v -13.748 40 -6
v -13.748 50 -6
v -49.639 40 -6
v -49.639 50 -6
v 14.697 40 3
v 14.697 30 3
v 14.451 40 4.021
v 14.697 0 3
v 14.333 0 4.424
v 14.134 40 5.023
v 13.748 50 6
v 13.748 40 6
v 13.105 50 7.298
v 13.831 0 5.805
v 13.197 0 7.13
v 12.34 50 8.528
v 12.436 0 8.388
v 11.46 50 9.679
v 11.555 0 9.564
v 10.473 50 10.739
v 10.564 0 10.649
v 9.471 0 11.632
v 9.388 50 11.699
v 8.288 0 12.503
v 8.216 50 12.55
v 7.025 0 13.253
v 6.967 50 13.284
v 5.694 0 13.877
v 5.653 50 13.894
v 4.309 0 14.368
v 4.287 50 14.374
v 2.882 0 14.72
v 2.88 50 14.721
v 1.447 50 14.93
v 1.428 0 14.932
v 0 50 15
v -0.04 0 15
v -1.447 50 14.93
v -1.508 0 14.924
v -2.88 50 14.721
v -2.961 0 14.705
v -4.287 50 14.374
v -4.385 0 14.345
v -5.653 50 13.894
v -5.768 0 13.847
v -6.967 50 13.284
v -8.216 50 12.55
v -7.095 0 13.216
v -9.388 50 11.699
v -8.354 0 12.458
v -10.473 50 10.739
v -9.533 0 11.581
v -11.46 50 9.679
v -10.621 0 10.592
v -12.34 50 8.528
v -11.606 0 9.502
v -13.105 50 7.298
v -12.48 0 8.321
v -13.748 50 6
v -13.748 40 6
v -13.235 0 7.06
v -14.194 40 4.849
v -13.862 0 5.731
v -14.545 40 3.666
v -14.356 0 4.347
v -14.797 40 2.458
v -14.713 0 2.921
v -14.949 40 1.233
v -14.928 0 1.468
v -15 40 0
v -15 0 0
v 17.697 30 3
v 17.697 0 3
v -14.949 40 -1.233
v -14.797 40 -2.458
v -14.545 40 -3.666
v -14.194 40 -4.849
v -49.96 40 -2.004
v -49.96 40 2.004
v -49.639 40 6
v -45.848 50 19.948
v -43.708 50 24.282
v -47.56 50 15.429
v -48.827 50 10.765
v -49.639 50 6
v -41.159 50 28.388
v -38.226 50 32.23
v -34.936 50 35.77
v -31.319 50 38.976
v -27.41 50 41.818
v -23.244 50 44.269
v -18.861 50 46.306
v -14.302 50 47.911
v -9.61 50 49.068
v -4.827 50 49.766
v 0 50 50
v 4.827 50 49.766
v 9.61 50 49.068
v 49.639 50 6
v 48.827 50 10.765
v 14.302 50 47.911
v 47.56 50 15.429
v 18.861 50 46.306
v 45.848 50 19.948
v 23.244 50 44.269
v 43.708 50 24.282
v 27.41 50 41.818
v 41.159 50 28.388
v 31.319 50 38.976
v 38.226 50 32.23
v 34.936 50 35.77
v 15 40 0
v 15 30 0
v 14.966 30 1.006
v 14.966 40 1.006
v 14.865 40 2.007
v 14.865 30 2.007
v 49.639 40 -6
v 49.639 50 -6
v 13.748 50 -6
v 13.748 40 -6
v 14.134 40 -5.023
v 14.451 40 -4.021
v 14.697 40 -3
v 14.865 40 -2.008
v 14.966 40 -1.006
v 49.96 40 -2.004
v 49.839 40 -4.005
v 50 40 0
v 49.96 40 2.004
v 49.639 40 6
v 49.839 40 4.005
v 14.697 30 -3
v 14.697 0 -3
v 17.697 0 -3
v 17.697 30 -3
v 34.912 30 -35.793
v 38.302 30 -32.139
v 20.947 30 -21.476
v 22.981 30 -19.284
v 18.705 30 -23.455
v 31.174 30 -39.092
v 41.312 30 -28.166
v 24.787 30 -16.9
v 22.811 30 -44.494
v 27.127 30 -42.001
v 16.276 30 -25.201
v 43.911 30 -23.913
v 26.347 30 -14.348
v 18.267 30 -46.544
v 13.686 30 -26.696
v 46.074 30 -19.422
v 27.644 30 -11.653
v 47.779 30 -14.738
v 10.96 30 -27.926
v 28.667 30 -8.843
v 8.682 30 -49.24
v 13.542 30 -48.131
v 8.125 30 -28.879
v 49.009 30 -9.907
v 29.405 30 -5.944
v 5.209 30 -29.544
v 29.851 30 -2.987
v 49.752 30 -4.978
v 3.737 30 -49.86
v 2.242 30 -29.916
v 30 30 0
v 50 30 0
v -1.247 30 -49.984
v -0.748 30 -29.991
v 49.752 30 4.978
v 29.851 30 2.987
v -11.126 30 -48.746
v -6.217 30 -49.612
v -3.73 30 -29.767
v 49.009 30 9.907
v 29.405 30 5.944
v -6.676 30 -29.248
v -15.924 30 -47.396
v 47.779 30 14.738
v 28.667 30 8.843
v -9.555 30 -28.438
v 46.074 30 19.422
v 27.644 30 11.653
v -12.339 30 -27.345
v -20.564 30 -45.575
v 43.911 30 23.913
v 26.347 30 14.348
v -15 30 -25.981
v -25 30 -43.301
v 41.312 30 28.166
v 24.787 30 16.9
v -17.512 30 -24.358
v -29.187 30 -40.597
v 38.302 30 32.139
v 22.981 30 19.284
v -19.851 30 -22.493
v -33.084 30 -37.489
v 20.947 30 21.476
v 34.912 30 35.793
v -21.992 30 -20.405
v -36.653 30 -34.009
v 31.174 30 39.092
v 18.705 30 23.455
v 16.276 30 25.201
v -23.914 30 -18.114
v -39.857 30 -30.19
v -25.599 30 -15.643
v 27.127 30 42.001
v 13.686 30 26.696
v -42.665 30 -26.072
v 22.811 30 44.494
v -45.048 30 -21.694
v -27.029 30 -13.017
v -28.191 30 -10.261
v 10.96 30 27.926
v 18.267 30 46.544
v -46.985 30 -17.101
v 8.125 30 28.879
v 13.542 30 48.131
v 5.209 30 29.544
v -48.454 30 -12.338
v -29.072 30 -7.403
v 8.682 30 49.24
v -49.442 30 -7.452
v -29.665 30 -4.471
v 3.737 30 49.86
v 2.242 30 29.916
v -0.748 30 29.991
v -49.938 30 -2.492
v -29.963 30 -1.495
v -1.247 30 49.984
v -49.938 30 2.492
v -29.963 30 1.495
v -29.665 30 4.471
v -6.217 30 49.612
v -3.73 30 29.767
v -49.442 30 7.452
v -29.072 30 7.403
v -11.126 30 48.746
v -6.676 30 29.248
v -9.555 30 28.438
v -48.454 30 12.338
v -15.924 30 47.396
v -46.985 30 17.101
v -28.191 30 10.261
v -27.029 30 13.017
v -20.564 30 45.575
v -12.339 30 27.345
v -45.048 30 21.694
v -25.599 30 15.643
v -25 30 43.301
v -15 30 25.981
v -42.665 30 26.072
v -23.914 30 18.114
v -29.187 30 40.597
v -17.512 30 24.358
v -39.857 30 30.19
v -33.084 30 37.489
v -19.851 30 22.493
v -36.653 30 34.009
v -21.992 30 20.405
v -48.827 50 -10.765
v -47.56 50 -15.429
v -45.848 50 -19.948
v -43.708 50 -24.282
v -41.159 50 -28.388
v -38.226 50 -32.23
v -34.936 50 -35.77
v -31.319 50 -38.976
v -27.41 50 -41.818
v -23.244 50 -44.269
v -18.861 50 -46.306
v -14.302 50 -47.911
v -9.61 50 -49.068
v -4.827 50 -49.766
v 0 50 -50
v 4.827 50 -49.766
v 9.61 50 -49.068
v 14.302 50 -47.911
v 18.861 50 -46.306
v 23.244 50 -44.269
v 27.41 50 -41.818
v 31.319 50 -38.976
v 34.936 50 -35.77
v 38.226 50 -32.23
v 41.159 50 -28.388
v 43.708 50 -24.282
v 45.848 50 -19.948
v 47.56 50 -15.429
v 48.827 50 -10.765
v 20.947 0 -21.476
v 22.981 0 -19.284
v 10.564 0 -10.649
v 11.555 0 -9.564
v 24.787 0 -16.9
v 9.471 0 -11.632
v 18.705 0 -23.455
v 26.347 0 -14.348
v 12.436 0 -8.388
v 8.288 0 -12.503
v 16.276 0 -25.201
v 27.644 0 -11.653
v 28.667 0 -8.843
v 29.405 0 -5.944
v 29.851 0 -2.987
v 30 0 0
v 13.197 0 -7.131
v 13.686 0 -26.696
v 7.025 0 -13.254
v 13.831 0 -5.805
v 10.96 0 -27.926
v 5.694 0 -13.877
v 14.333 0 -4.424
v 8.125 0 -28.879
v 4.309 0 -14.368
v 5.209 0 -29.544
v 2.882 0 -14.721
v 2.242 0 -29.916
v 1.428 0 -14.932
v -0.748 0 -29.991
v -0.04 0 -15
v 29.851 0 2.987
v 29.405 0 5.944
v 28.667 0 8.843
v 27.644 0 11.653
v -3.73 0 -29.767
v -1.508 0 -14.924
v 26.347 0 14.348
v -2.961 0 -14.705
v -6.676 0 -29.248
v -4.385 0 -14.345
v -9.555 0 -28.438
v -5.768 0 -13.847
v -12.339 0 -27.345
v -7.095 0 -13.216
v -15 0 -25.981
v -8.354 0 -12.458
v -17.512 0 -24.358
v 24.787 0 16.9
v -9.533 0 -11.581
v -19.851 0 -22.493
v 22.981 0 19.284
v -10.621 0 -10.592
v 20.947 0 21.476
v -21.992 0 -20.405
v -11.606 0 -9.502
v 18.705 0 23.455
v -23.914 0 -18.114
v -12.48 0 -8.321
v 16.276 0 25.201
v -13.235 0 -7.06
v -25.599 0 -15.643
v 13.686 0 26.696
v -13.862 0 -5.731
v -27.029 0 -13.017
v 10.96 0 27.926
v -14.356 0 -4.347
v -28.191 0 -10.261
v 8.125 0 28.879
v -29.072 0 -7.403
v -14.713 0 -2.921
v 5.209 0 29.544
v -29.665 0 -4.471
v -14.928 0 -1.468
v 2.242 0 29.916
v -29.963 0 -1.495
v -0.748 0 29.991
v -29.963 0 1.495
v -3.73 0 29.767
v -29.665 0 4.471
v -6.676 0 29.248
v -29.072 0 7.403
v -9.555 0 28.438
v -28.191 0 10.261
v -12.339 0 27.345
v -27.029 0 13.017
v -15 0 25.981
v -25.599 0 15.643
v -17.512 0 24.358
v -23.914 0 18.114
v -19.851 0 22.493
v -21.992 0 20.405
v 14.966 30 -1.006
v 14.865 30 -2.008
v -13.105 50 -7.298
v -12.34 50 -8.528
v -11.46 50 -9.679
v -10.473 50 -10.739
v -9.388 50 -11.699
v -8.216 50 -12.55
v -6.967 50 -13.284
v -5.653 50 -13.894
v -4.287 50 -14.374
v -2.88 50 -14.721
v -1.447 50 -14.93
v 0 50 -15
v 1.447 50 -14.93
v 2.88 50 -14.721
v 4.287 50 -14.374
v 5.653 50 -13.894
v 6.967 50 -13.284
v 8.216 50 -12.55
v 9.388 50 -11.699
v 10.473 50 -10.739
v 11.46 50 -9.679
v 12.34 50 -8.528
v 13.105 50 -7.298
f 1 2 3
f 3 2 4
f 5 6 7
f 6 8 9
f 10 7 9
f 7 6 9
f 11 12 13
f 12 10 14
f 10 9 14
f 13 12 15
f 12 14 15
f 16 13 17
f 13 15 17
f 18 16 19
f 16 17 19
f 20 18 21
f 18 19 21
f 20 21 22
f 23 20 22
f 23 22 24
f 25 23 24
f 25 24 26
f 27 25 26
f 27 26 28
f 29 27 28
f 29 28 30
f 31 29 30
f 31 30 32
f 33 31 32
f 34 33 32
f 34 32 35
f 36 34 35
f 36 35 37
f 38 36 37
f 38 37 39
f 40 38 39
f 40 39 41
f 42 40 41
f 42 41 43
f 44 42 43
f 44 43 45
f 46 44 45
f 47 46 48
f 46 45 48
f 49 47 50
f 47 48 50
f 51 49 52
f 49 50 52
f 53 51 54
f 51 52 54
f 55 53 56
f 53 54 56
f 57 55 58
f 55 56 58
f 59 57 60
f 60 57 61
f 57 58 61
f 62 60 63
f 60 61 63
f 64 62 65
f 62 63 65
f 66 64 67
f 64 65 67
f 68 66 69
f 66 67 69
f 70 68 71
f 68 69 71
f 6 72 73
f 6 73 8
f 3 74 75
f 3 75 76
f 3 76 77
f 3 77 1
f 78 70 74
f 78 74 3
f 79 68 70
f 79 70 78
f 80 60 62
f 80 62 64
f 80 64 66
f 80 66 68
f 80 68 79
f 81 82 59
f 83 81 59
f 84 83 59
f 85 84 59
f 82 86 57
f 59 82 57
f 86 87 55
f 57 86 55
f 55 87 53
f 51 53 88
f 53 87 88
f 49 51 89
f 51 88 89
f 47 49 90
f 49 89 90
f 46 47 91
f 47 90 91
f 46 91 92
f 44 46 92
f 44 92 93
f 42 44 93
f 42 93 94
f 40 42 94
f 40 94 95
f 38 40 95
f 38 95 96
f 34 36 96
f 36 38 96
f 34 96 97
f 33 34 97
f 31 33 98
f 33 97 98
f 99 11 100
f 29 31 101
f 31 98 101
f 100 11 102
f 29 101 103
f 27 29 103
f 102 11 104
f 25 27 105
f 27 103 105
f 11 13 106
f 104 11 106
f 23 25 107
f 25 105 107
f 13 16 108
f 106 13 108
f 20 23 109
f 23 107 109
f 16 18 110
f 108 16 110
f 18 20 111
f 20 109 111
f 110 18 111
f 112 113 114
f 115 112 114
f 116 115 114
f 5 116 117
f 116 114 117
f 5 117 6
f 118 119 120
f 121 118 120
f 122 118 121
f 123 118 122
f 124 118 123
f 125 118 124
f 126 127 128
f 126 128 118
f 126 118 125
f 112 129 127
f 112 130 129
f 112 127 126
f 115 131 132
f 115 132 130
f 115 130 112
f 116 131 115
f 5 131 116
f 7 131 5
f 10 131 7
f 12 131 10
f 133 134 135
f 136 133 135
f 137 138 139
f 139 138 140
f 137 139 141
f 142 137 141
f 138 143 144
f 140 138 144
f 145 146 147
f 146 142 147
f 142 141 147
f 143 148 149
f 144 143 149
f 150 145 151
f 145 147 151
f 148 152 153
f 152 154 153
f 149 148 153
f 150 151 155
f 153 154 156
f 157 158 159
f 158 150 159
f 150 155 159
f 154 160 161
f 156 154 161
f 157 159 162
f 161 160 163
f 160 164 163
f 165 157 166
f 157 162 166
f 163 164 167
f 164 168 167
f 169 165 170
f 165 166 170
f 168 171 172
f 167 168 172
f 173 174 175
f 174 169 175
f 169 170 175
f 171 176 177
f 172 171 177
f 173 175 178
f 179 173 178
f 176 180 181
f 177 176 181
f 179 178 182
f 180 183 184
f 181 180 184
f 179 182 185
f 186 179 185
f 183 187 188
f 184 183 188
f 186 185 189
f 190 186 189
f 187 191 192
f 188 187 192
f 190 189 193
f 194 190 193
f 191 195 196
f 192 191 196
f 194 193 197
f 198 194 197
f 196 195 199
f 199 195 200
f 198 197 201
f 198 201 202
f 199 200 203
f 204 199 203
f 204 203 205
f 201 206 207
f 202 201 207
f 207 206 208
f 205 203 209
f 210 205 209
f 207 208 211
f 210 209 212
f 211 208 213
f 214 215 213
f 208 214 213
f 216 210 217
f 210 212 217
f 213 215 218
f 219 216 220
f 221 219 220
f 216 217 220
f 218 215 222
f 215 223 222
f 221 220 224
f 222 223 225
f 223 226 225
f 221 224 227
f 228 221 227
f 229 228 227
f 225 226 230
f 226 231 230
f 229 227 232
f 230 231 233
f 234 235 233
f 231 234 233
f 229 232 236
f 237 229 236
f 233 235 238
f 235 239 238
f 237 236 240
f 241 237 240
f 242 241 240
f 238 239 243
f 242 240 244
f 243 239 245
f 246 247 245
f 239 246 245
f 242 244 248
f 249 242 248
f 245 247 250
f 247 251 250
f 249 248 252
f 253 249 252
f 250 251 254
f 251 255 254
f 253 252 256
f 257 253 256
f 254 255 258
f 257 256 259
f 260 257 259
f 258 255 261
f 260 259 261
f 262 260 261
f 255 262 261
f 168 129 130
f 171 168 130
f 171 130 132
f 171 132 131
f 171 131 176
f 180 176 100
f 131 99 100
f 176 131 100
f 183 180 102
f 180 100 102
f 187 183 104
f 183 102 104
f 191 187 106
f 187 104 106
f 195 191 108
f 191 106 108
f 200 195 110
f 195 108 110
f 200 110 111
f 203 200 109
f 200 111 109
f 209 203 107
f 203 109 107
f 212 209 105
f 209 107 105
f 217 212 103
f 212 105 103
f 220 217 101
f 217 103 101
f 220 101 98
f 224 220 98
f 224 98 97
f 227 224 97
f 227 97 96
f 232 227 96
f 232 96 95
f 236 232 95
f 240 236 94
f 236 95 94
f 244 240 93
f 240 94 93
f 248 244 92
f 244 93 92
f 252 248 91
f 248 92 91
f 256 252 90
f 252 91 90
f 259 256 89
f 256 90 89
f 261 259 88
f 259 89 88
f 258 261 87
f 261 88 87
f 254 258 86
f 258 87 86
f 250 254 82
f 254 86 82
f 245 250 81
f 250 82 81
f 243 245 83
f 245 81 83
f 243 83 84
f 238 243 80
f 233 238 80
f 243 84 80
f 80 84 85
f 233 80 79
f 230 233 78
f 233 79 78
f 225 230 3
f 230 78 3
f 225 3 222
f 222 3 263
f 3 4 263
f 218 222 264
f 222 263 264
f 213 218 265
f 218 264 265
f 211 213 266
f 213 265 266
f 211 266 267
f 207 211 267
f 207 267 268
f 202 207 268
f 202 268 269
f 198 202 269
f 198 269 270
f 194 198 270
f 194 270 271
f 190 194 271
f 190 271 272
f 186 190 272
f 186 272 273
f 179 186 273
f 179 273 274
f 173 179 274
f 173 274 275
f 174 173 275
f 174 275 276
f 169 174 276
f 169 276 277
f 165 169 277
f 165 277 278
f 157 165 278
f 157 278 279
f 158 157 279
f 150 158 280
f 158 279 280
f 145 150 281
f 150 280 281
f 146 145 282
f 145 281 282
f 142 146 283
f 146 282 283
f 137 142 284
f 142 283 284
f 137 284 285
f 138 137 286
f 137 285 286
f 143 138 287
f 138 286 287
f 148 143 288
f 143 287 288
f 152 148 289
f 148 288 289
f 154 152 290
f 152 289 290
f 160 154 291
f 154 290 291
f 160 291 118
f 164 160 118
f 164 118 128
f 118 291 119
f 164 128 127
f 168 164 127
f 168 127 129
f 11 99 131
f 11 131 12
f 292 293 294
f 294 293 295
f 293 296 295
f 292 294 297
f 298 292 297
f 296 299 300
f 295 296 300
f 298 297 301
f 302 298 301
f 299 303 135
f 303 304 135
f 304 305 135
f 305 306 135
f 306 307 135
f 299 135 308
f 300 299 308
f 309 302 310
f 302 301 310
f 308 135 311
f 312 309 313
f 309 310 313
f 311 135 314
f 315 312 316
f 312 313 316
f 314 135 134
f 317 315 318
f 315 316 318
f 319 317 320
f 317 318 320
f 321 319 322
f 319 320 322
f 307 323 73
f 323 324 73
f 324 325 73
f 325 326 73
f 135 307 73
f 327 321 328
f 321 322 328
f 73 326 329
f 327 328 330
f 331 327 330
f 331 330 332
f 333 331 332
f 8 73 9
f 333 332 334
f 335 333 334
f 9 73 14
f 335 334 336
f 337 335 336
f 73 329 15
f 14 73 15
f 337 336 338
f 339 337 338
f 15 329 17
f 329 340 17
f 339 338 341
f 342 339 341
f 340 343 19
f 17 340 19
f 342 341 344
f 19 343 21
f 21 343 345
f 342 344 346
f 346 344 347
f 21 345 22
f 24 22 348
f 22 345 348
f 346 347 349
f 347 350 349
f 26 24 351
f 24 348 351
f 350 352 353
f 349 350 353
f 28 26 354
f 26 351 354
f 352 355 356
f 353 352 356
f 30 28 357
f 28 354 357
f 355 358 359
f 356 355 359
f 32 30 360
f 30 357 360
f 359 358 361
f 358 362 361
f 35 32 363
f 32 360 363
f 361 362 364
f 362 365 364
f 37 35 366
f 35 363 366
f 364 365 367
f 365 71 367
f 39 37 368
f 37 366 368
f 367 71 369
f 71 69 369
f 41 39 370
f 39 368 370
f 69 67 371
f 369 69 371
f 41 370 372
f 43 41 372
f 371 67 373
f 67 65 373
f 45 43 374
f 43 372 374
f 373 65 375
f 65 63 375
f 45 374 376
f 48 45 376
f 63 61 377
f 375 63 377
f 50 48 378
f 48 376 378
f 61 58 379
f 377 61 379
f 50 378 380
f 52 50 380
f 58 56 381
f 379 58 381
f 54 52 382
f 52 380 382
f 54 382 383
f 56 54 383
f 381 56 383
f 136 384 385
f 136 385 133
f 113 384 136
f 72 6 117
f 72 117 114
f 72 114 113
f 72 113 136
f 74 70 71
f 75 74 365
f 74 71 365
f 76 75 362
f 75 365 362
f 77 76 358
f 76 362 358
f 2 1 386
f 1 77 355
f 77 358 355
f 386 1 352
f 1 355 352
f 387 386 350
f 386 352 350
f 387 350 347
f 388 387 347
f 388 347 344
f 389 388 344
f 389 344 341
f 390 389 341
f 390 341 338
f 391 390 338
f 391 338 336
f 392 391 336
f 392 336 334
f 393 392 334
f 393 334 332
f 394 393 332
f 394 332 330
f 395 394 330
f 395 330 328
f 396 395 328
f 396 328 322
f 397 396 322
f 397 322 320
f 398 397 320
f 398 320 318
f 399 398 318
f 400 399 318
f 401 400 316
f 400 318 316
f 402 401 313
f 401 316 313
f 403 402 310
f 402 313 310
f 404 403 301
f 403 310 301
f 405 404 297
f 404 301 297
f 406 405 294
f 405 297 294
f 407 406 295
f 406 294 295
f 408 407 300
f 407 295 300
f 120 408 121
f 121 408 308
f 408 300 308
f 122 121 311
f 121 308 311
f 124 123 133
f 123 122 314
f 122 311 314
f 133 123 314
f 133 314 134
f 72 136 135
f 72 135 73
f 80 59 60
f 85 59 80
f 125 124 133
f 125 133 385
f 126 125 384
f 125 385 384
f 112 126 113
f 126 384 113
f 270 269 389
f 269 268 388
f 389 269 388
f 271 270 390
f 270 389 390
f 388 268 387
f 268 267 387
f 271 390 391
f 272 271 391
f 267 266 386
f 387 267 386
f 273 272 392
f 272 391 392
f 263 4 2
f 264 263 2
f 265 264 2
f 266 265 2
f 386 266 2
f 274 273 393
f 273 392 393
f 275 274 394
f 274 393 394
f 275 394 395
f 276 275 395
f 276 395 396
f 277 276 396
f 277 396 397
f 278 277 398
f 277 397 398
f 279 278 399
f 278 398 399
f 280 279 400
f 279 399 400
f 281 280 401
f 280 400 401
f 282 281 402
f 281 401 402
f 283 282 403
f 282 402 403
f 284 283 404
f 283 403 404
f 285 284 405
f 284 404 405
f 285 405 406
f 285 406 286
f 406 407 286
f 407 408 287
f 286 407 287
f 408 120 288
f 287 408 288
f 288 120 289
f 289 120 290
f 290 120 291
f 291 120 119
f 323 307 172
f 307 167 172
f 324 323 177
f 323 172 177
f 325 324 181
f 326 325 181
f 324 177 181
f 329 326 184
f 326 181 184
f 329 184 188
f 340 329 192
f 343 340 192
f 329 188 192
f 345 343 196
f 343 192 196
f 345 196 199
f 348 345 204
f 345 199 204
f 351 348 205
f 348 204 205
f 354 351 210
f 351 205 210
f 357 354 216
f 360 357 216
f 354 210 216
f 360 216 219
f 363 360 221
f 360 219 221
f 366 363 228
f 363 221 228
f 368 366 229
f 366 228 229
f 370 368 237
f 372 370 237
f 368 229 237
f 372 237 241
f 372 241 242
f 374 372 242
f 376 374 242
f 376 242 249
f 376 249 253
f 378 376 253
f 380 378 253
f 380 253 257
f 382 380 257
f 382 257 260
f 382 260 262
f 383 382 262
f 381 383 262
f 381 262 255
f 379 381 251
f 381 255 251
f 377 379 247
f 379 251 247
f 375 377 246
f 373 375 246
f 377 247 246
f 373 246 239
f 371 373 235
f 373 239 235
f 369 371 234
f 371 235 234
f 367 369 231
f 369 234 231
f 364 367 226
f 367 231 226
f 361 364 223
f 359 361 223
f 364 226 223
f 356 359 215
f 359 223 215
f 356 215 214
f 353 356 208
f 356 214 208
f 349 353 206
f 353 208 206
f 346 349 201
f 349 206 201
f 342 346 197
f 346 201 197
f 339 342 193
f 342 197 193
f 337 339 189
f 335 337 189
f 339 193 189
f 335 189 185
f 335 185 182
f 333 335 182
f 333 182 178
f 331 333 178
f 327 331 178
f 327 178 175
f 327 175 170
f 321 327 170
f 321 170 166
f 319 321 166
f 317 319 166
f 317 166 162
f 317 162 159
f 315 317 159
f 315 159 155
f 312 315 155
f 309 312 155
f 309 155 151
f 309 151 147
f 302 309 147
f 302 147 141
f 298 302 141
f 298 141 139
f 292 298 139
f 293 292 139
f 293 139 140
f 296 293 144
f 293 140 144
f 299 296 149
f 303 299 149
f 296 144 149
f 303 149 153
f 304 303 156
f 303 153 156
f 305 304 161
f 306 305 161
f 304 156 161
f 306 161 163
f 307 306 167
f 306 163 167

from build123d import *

# Parameters (mm, degrees)
F3_DEPTH = 50.001
F4_DEPTH = 30
F5_W     = 125.01227
F5_H     = 12
F6_DEPTH = 10


with BuildPart() as f1:
    # F0 (on Top) → F1 (revolve)
    with BuildSketch(Plane.XY):
        Polygon((0, 50), (0, 0), (30, 0), (30, 30), (50, 30), (50, 50), align=None)
    revolve(axis=Axis((0, 25, 0), (0, -1, 0)))

    # F2 (on face) → F3 (cut, through all)
    with BuildSketch(Plane.XZ):
        with BuildLine():
            Line((9.729625, 0), (15, 0))
            ThreePointArc((15, 0), (14.92405, 1.507558), (14.696969, 2.99985))
            Line((14.696969, 2.99985), (9.649316, 2.99985))
            Line((9.649316, 2.99985), (9.729625, 0))
        make_face()
        with BuildLine():
            ThreePointArc((-15, 0), (-1.507634, -14.924042), (14.696938, -3))
            Line((14.696938, -3), (9.809938, -3))
            Line((9.809938, -3), (9.729625, 0))
            Line((9.729625, 0), (-15, 0))
        make_face()
        with BuildLine():
            ThreePointArc((14.696938, -3), (14.924042, -1.507634), (15, 0))
            Line((15, 0), (9.729625, 0))
            Line((9.729625, 0), (9.809938, -3))
            Line((9.809938, -3), (14.696938, -3))
        make_face()
        with BuildLine():
            Line((9.649316, 2.99985), (14.696969, 2.99985))
            ThreePointArc((14.696969, 2.99985), (-1.507558, 14.92405), (-15, 0))
            Line((-15, 0), (9.729625, 0))
            Line((9.729625, 0), (9.649316, 2.99985))
        make_face()
    extrude(amount=-F3_DEPTH, mode=Mode.SUBTRACT)

    # F2 (on face) → F4 (cut)
    with BuildSketch(Plane.XZ):
        with BuildLine():
            Line((17.696969, 0), (15, 0))
            ThreePointArc((15, 0), (14.924042, -1.507634), (14.696938, -3))
            Line((14.696938, -3), (17.696969, -3))
            Line((17.696969, -3), (17.696969, 0))
        make_face()
        with BuildLine():
            ThreePointArc((14.696969, 2.99985), (14.92405, 1.507558), (15, 0))
            Line((15, 0), (17.696969, 0))
            Line((17.696969, 0), (17.696969, 2.99985))
            Line((17.696969, 2.99985), (14.696969, 2.99985))
        make_face()
        with BuildLine():
            Line((9.649316, 2.99985), (14.696969, 2.99985))
            ThreePointArc((14.696969, 2.99985), (-1.507558, 14.92405), (-15, 0))
            Line((-15, 0), (9.729625, 0))
            Line((9.729625, 0), (9.649316, 2.99985))
        make_face()
        with BuildLine():
            ThreePointArc((-15, 0), (-1.507634, -14.924042), (14.696938, -3))
            Line((14.696938, -3), (9.809938, -3))
            Line((9.809938, -3), (9.729625, 0))
            Line((9.729625, 0), (-15, 0))
        make_face()
    extrude(amount=-F4_DEPTH, mode=Mode.SUBTRACT)

    # F5 (on face) → F6 (cut)
    with BuildSketch(Plane(origin=(0, 50, 0), x_dir=(-1, 0, 0), z_dir=(0, 1, 0))):
        Rectangle(F5_W, F5_H)
    extrude(amount=-F6_DEPTH, mode=Mode.SUBTRACT)


solid = f1.part
